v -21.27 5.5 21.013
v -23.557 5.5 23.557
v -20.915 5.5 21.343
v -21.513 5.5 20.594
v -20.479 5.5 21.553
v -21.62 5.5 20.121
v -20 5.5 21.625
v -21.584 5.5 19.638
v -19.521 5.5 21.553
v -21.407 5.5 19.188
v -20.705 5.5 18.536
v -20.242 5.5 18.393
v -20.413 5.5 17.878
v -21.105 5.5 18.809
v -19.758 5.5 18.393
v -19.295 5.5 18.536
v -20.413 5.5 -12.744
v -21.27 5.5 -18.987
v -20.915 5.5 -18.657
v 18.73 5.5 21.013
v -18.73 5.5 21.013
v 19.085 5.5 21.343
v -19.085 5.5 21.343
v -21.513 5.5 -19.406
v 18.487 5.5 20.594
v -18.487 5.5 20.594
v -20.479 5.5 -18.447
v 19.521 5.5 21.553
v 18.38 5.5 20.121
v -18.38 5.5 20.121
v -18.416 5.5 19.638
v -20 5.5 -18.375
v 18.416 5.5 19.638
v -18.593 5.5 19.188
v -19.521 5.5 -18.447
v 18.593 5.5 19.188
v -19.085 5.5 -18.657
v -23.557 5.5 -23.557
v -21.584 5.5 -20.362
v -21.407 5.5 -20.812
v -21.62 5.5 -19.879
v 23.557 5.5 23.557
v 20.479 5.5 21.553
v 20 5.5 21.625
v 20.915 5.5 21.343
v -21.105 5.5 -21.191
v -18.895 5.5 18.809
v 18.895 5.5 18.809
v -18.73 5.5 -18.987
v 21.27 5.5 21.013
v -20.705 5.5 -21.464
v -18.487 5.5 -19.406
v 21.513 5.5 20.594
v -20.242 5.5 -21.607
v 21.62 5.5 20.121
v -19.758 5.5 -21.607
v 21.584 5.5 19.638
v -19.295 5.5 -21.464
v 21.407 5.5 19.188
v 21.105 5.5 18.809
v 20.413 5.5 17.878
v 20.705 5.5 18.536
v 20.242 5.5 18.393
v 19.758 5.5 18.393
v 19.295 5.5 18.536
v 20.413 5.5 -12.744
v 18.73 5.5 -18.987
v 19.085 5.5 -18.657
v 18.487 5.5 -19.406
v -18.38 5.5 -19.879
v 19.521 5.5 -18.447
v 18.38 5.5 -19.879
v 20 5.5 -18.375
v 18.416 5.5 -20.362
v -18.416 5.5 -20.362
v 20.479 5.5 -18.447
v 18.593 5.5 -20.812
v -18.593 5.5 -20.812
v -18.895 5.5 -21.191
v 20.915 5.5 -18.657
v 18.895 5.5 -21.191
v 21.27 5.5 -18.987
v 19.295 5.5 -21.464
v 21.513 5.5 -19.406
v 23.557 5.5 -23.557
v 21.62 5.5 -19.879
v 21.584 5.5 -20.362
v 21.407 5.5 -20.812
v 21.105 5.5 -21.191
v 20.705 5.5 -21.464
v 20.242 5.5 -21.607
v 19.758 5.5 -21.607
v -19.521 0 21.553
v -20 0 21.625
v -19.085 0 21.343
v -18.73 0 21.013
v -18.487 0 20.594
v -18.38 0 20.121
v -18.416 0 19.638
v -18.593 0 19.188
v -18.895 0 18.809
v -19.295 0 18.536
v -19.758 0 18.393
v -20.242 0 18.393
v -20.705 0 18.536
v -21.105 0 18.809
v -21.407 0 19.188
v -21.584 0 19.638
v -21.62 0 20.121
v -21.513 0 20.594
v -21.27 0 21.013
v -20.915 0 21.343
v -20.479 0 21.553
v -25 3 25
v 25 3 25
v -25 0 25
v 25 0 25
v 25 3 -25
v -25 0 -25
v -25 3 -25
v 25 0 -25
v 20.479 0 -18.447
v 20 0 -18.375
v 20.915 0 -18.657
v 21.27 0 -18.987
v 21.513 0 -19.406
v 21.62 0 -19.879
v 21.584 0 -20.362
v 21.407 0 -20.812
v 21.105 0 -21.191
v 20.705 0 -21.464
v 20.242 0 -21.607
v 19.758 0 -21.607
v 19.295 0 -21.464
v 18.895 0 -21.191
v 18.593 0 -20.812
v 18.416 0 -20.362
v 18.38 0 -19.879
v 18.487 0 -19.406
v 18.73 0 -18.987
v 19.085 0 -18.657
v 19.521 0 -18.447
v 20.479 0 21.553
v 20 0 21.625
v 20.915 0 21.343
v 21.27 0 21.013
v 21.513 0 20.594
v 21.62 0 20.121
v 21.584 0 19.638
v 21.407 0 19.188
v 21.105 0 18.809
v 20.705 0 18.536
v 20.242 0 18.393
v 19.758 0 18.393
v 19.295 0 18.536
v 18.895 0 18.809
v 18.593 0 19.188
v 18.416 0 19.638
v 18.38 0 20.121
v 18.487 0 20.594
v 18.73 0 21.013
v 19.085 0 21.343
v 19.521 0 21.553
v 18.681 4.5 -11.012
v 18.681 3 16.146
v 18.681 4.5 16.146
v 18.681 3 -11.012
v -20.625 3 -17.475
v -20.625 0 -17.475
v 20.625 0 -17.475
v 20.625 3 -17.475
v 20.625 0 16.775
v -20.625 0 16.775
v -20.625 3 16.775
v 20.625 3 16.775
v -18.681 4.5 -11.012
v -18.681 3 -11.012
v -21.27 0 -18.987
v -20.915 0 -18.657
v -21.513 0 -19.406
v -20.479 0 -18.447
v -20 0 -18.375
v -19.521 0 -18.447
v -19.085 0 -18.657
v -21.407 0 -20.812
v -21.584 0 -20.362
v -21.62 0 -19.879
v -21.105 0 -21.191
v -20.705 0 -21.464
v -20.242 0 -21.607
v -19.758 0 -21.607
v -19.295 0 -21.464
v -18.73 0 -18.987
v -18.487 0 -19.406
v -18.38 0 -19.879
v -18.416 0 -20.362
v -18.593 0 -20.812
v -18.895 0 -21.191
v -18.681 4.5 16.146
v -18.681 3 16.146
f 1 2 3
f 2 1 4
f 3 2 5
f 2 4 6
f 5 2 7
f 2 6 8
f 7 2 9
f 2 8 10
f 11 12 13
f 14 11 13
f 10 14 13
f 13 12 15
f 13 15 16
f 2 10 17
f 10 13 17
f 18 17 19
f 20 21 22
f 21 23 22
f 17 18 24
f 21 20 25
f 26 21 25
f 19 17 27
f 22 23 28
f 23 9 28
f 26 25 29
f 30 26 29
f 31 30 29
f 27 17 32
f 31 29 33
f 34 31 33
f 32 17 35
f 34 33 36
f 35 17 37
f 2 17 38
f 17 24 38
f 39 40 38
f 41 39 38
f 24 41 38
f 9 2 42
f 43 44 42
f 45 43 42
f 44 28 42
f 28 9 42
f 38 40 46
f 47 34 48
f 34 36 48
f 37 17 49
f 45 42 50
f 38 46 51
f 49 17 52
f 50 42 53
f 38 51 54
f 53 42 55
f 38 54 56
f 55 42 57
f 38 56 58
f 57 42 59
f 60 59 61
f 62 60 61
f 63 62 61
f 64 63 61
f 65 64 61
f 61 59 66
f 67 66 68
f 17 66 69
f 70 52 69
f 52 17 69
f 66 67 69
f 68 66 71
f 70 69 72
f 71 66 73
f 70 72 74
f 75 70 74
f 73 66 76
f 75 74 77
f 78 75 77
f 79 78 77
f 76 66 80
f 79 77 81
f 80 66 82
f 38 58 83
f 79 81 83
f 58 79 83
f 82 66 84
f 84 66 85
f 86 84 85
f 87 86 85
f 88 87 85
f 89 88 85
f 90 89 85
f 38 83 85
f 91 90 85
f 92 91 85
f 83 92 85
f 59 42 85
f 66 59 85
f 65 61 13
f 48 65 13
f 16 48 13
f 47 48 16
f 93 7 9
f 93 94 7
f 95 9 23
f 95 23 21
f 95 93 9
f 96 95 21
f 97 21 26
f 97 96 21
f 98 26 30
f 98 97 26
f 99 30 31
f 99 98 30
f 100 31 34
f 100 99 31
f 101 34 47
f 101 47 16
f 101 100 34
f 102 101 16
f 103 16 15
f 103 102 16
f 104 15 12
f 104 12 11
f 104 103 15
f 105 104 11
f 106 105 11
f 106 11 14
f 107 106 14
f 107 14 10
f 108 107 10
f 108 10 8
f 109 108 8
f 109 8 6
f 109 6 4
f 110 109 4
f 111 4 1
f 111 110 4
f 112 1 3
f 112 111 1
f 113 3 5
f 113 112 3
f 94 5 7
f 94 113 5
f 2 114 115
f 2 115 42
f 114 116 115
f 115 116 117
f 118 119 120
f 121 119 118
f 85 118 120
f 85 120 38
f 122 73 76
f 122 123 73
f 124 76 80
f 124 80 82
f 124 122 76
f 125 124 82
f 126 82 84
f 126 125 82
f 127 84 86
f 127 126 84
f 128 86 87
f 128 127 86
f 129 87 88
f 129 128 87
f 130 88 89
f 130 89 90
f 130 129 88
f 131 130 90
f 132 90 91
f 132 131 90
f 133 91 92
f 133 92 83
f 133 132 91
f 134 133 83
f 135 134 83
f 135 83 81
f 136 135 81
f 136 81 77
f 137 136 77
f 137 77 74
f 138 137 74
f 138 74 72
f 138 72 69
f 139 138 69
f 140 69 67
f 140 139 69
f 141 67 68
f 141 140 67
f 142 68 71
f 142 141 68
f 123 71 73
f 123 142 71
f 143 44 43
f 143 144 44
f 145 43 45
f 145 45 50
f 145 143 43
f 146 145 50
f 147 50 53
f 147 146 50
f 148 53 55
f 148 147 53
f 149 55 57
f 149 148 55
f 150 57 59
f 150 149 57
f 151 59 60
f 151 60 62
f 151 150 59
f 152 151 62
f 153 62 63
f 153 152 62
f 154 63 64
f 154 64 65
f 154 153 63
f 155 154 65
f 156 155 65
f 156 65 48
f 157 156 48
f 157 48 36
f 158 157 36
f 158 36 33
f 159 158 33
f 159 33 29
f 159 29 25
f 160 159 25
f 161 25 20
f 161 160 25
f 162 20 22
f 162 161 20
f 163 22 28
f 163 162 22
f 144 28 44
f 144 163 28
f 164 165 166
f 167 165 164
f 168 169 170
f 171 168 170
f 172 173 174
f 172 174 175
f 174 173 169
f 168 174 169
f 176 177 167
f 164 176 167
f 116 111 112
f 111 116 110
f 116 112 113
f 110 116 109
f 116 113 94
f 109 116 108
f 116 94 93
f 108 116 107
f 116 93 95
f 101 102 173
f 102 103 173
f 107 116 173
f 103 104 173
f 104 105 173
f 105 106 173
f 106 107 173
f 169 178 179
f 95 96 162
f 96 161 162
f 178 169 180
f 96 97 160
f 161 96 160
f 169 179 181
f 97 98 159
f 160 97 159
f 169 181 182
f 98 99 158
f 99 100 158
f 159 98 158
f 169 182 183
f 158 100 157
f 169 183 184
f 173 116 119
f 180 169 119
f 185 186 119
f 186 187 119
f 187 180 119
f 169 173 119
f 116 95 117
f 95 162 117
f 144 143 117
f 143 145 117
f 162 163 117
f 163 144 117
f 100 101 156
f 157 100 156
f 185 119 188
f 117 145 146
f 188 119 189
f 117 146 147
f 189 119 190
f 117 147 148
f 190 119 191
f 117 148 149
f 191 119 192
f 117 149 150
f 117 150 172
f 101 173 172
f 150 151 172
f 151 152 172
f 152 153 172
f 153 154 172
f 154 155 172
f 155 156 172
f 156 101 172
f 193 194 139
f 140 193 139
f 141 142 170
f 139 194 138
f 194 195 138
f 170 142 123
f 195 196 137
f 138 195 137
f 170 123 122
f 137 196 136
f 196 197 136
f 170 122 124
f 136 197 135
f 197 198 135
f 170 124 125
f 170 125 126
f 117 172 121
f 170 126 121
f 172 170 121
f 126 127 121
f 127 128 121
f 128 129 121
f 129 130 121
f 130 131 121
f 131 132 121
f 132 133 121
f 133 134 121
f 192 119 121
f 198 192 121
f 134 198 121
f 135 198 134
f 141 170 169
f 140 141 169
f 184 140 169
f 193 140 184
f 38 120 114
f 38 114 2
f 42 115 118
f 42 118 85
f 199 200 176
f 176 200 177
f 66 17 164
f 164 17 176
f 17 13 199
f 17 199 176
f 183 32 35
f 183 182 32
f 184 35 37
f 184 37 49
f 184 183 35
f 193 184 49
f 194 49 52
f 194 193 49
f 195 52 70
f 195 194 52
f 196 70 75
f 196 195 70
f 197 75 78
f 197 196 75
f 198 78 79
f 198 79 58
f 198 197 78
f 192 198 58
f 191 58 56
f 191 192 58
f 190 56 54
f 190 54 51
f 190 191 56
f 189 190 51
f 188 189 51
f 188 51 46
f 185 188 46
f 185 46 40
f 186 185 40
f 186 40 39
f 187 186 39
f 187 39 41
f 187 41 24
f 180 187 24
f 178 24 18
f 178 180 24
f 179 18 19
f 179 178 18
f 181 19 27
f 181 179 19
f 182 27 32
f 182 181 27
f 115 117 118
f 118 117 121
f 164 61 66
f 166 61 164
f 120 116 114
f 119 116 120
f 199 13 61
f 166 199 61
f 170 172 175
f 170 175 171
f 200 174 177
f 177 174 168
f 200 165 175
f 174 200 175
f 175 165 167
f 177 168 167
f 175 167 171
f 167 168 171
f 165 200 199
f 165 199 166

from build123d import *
from OCP.BRepFilletAPI import BRepFilletAPI_MakeChamfer

# Parameters (mm, degrees)
SKETCH1_W           = 50
SKETCH1_H           = 50
SKETCH1_W_2         = 46
SKETCH1_H_2         = 46
SKETCH1_R           = 1.625
SKETCH1_W_3         = 41.25
SKETCH1_H_3         = 34.25
BOSS_EXTRUDE1_DEPTH = 3
BOSS_EXTRUDE2_START = 3
SKETCH1_3_W         = 46
SKETCH1_3_H         = 46
SKETCH1_3_R         = 1.625
SKETCH1_3_W_2       = 41.25
SKETCH1_3_H_2       = 34.25
SKETCH1_3_W_3       = 37.362596296
SKETCH1_3_H_3       = 27.15767644
BOSS_EXTRUDE2_DEPTH = 2.5
CHAMFER1_SIZE       = 2
CHAMFER1_SIZE_2     = 3.464101615
CHAMFER2_SIZE       = 1
CHAMFER2_SIZE2      = 1.732050808


with BuildPart() as part:
    # Sketch1 → Boss-Extrude1 (new body)
    # profile 1 of 2: a face of its own
    with BuildSketch(Plane(origin=(0, 0, 0), x_dir=(1, 0, 0), z_dir=(0, 1, 0))):
        Rectangle(SKETCH1_W, SKETCH1_H)
        Rectangle(SKETCH1_W_2, SKETCH1_H_2, mode=Mode.SUBTRACT)
    # profile 2 of 2: a face of its own
    with BuildSketch(Plane(origin=(0, 0, 0), x_dir=(1, 0, 0), z_dir=(0, 1, 0))):
        Rectangle(SKETCH1_W_2, SKETCH1_H_2)
        with Locations(Location((-20, -20, 0), (0, 0, 270))):
            Circle(SKETCH1_R, mode=Mode.SUBTRACT)
        with Locations(Location((20, -20, 0), (0, 0, 270))):
            Circle(SKETCH1_R, mode=Mode.SUBTRACT)
        with Locations(Location((20, 20, 0), (0, 0, 270))):
            Circle(SKETCH1_R, mode=Mode.SUBTRACT)
        with Locations(Location((-20, 20, 0), (0, 0, 270))):
            Circle(SKETCH1_R, mode=Mode.SUBTRACT)
        with Locations((0, 0.35)):
            Rectangle(SKETCH1_W_3, SKETCH1_H_3, mode=Mode.SUBTRACT)
    extrude(amount=BOSS_EXTRUDE1_DEPTH)

    # Sketch1<3> → Boss-Extrude2 (add)
    # profile 1 of 2: a face of its own
    with BuildSketch(Plane(origin=(0, 0, 0), x_dir=(1, 0, 0), z_dir=(0, 1, 0)).offset(BOSS_EXTRUDE2_START)):
        Rectangle(SKETCH1_3_W, SKETCH1_3_H)
        with Locations(Location((-20, -20, 0), (0, 0, 270))):
            Circle(SKETCH1_3_R, mode=Mode.SUBTRACT)
        with Locations(Location((20, -20, 0), (0, 0, 270))):
            Circle(SKETCH1_3_R, mode=Mode.SUBTRACT)
        with Locations(Location((20, 20, 0), (0, 0, 270))):
            Circle(SKETCH1_3_R, mode=Mode.SUBTRACT)
        with Locations(Location((-20, 20, 0), (0, 0, 270))):
            Circle(SKETCH1_3_R, mode=Mode.SUBTRACT)
        with Locations((0, 0.35)):
            Rectangle(SKETCH1_3_W_2, SKETCH1_3_H_2, mode=Mode.SUBTRACT)
    # profile 2 of 2: a face of its own
    with BuildSketch(Plane(origin=(0, 0, 0), x_dir=(1, 0, 0), z_dir=(0, 1, 0)).offset(BOSS_EXTRUDE2_START)):
        with Locations((0, 0.35)):
            Rectangle(SKETCH1_3_W_2, SKETCH1_3_H_2)
        with Locations((0, -2.566787067)):
            Rectangle(SKETCH1_3_W_3, SKETCH1_3_H_3, mode=Mode.SUBTRACT)
    extrude(amount=BOSS_EXTRUDE2_DEPTH)

    # Chamfer1
    # the kernel refuses this chamfer: 3.464101615, 2 mm, written as the material it adds along each edge
    with BuildSketch(Plane(origin=(-23, 3, -23), x_dir=(0, -0.05789386240267147, -0.9983227437537926), z_dir=(1, 0, 0))) as chamfer1_piece_1_section:
        Polygon((CHAMFER1_SIZE * 0.998322743754, CHAMFER1_SIZE * 0.0578938624027), (-CHAMFER1_SIZE_2 * 0.057893862405, CHAMFER1_SIZE_2 * 0.998322743793), (0, 0), align=None)
    chamfer1_piece_1 = extrude(amount=46, mode=Mode.PRIVATE)
    chamfer1_piece_1 = split(chamfer1_piece_1, bisect_by=Plane(origin=(0, 3.976343679, -25), z_dir=(0, 0, 1)), keep=Keep.TOP, mode=Mode.PRIVATE)
    chamfer1_piece_1 = split(chamfer1_piece_1, bisect_by=Plane(origin=(0, 5.5, -23.695570033), z_dir=(0, -1, 0)), keep=Keep.TOP, mode=Mode.PRIVATE)
    add(chamfer1_piece_1)
    with BuildSketch(Plane(origin=(-23, 3, 23), x_dir=(-0.9983227437537926, -0.05789386240267147, 0), z_dir=(0, 0, -1))) as chamfer1_piece_2_section:
        Polygon((CHAMFER1_SIZE * 0.998322743754, CHAMFER1_SIZE * 0.0578938624027), (-CHAMFER1_SIZE_2 * 0.057893862405, CHAMFER1_SIZE_2 * 0.998322743793), (0, 0), align=None)
    chamfer1_piece_2 = extrude(amount=46, mode=Mode.PRIVATE)
    chamfer1_piece_2 = split(chamfer1_piece_2, bisect_by=Plane(origin=(-25, 3.976343679, 0), z_dir=(1, 0, 0)), keep=Keep.TOP, mode=Mode.PRIVATE)
    chamfer1_piece_2 = split(chamfer1_piece_2, bisect_by=Plane(origin=(-23.695570033, 5.5, 0), z_dir=(0, -1, 0)), keep=Keep.TOP, mode=Mode.PRIVATE)
    add(chamfer1_piece_2)
    with BuildSketch(Plane(origin=(23, 3, 23), x_dir=(0, -0.05789386240267147, 0.9983227437537926), z_dir=(-1, 0, 0))) as chamfer1_piece_3_section:
        Polygon((CHAMFER1_SIZE * 0.998322743754, CHAMFER1_SIZE * 0.0578938624027), (-CHAMFER1_SIZE_2 * 0.057893862405, CHAMFER1_SIZE_2 * 0.998322743793), (0, 0), align=None)
    chamfer1_piece_3 = extrude(amount=46, mode=Mode.PRIVATE)
    chamfer1_piece_3 = split(chamfer1_piece_3, bisect_by=Plane(origin=(0, 3.976343679, 25), z_dir=(0, 0, -1)), keep=Keep.TOP, mode=Mode.PRIVATE)
    chamfer1_piece_3 = split(chamfer1_piece_3, bisect_by=Plane(origin=(0, 5.5, 23.695570033), z_dir=(0, -1, 0)), keep=Keep.TOP, mode=Mode.PRIVATE)
    add(chamfer1_piece_3)
    with BuildSketch(Plane(origin=(23, 3, -23), x_dir=(0.9983227437537926, -0.05789386240267147, 0), z_dir=(0, 0, 1))) as chamfer1_piece_4_section:
        Polygon((CHAMFER1_SIZE * 0.998322743754, CHAMFER1_SIZE * 0.0578938624027), (-CHAMFER1_SIZE_2 * 0.057893862405, CHAMFER1_SIZE_2 * 0.998322743793), (0, 0), align=None)
    chamfer1_piece_4 = extrude(amount=46, mode=Mode.PRIVATE)
    chamfer1_piece_4 = split(chamfer1_piece_4, bisect_by=Plane(origin=(25, 3.976343679, 0), z_dir=(-1, 0, 0)), keep=Keep.TOP, mode=Mode.PRIVATE)
    chamfer1_piece_4 = split(chamfer1_piece_4, bisect_by=Plane(origin=(23.695570033, 5.5, 0), z_dir=(0, -1, 0)), keep=Keep.TOP, mode=Mode.PRIVATE)
    add(chamfer1_piece_4)
    with BuildSketch(Plane(origin=(-23, 3, 23), x_dir=(-0.9983227437537926, -0.05789386240267147, 0), z_dir=(0, 0, -1))) as chamfer1_piece_5a_section:
        Polygon((CHAMFER1_SIZE * 0.998322743754, CHAMFER1_SIZE * 0.0578938624027), (-CHAMFER1_SIZE_2 * 0.057893862405, CHAMFER1_SIZE_2 * 0.998322743793), (0, 0), align=None)
    chamfer1_piece_5a = extrude(amount=54.961927941, mode=Mode.PRIVATE)
    chamfer1_piece_5a = split(chamfer1_piece_5a, bisect_by=Plane(origin=(-23.695570033, 3.976343679, -25), z_dir=(0, 0, 1)), keep=Keep.TOP, mode=Mode.PRIVATE)
    chamfer1_piece_5a = split(chamfer1_piece_5a, bisect_by=Plane(origin=(-25, 3.976343679, -24), z_dir=(1, 0, 0)), keep=Keep.TOP, mode=Mode.PRIVATE)
    chamfer1_piece_5a = split(chamfer1_piece_5a, bisect_by=Plane(origin=(-23.695570033, 3.976343679, -23), z_dir=(0, 0, -1)), keep=Keep.TOP, mode=Mode.PRIVATE)
    chamfer1_piece_5a = split(chamfer1_piece_5a, bisect_by=Plane(origin=(-23.695570033, 5.5, -24), z_dir=(0, -1, 0)), keep=Keep.TOP, mode=Mode.PRIVATE)
    with BuildSketch(Plane(origin=(-31.961927941, 3, -23), x_dir=(0, -0.05789386240267147, -0.9983227437537926), z_dir=(1, 0, 0))) as chamfer1_piece_5b_section:
        Polygon((CHAMFER1_SIZE * 0.998322743754, CHAMFER1_SIZE * 0.0578938624027), (-CHAMFER1_SIZE_2 * 0.057893862405, CHAMFER1_SIZE_2 * 0.998322743793), (0, 0), align=None)
    chamfer1_piece_5b = extrude(amount=54.961927941, mode=Mode.PRIVATE)
    chamfer1_piece_5b = split(chamfer1_piece_5b, bisect_by=Plane(origin=(-24, 3.976343679, -25), z_dir=(0, 0, 1)), keep=Keep.TOP, mode=Mode.PRIVATE)
    chamfer1_piece_5b = split(chamfer1_piece_5b, bisect_by=Plane(origin=(-25, 3.976343679, -23.695570033), z_dir=(1, 0, 0)), keep=Keep.TOP, mode=Mode.PRIVATE)
    chamfer1_piece_5b = split(chamfer1_piece_5b, bisect_by=Plane(origin=(-23, 3.976343679, -23.695570033), z_dir=(-1, 0, 0)), keep=Keep.TOP, mode=Mode.PRIVATE)
    chamfer1_piece_5b = split(chamfer1_piece_5b, bisect_by=Plane(origin=(-24, 5.5, -23.695570033), z_dir=(0, -1, 0)), keep=Keep.TOP, mode=Mode.PRIVATE)
    chamfer1_piece_5 = chamfer1_piece_5a & chamfer1_piece_5b
    add(chamfer1_piece_5)
    with BuildSketch(Plane(origin=(23, 3, -31.961927941), x_dir=(0.9983227437537926, -0.05789386240267147, 0), z_dir=(0, 0, 1))) as chamfer1_piece_6a_section:
        Polygon((CHAMFER1_SIZE * 0.998322743754, CHAMFER1_SIZE * 0.0578938624027), (-CHAMFER1_SIZE_2 * 0.057893862405, CHAMFER1_SIZE_2 * 0.998322743793), (0, 0), align=None)
    chamfer1_piece_6a = extrude(amount=54.961927941, mode=Mode.PRIVATE)
    chamfer1_piece_6a = split(chamfer1_piece_6a, bisect_by=Plane(origin=(25, 3.976343679, -24), z_dir=(-1, 0, 0)), keep=Keep.TOP, mode=Mode.PRIVATE)
    chamfer1_piece_6a = split(chamfer1_piece_6a, bisect_by=Plane(origin=(23.695570033, 3.976343679, -25), z_dir=(0, 0, 1)), keep=Keep.TOP, mode=Mode.PRIVATE)
    chamfer1_piece_6a = split(chamfer1_piece_6a, bisect_by=Plane(origin=(23.695570033, 3.976343679, -23), z_dir=(0, 0, -1)), keep=Keep.TOP, mode=Mode.PRIVATE)
    chamfer1_piece_6a = split(chamfer1_piece_6a, bisect_by=Plane(origin=(23.695570033, 5.5, -24), z_dir=(0, -1, 0)), keep=Keep.TOP, mode=Mode.PRIVATE)
    with BuildSketch(Plane(origin=(-23, 3, -23), x_dir=(0, -0.05789386240267147, -0.9983227437537926), z_dir=(1, 0, 0))) as chamfer1_piece_6b_section:
        Polygon((CHAMFER1_SIZE * 0.998322743754, CHAMFER1_SIZE * 0.0578938624027), (-CHAMFER1_SIZE_2 * 0.057893862405, CHAMFER1_SIZE_2 * 0.998322743793), (0, 0), align=None)
    chamfer1_piece_6b = extrude(amount=54.961927941, mode=Mode.PRIVATE)
    chamfer1_piece_6b = split(chamfer1_piece_6b, bisect_by=Plane(origin=(25, 3.976343679, -23.695570033), z_dir=(-1, 0, 0)), keep=Keep.TOP, mode=Mode.PRIVATE)
    chamfer1_piece_6b = split(chamfer1_piece_6b, bisect_by=Plane(origin=(24, 3.976343679, -25), z_dir=(0, 0, 1)), keep=Keep.TOP, mode=Mode.PRIVATE)
    chamfer1_piece_6b = split(chamfer1_piece_6b, bisect_by=Plane(origin=(23, 3.976343679, -23.695570033), z_dir=(1, 0, 0)), keep=Keep.TOP, mode=Mode.PRIVATE)
    chamfer1_piece_6b = split(chamfer1_piece_6b, bisect_by=Plane(origin=(24, 5.5, -23.695570033), z_dir=(0, -1, 0)), keep=Keep.TOP, mode=Mode.PRIVATE)
    chamfer1_piece_6 = chamfer1_piece_6a & chamfer1_piece_6b
    add(chamfer1_piece_6)
    with BuildSketch(Plane(origin=(23, 3, 23), x_dir=(0, -0.05789386240267147, 0.9983227437537926), z_dir=(-1, 0, 0))) as chamfer1_piece_7a_section:
        Polygon((CHAMFER1_SIZE * 0.998322743754, CHAMFER1_SIZE * 0.0578938624027), (-CHAMFER1_SIZE_2 * 0.057893862405, CHAMFER1_SIZE_2 * 0.998322743793), (0, 0), align=None)
    chamfer1_piece_7a = extrude(amount=54.961927941, mode=Mode.PRIVATE)
    chamfer1_piece_7a = split(chamfer1_piece_7a, bisect_by=Plane(origin=(-24, 3.976343679, 25), z_dir=(0, 0, -1)), keep=Keep.TOP, mode=Mode.PRIVATE)
    chamfer1_piece_7a = split(chamfer1_piece_7a, bisect_by=Plane(origin=(-25, 3.976343679, 23.695570033), z_dir=(1, 0, 0)), keep=Keep.TOP, mode=Mode.PRIVATE)
    chamfer1_piece_7a = split(chamfer1_piece_7a, bisect_by=Plane(origin=(-24, 5.5, 23.695570033), z_dir=(0, -1, 0)), keep=Keep.TOP, mode=Mode.PRIVATE)
    chamfer1_piece_7a = split(chamfer1_piece_7a, bisect_by=Plane(origin=(-23, 3.976343679, 23.695570033), z_dir=(-1, 0, 0)), keep=Keep.TOP, mode=Mode.PRIVATE)
    with BuildSketch(Plane(origin=(-23, 3, 31.961927941), x_dir=(-0.9983227437537926, -0.05789386240267147, 0), z_dir=(0, 0, -1))) as chamfer1_piece_7b_section:
        Polygon((CHAMFER1_SIZE * 0.998322743754, CHAMFER1_SIZE * 0.0578938624027), (-CHAMFER1_SIZE_2 * 0.057893862405, CHAMFER1_SIZE_2 * 0.998322743793), (0, 0), align=None)
    chamfer1_piece_7b = extrude(amount=54.961927941, mode=Mode.PRIVATE)
    chamfer1_piece_7b = split(chamfer1_piece_7b, bisect_by=Plane(origin=(-23.695570033, 3.976343679, 25), z_dir=(0, 0, -1)), keep=Keep.TOP, mode=Mode.PRIVATE)
    chamfer1_piece_7b = split(chamfer1_piece_7b, bisect_by=Plane(origin=(-25, 3.976343679, 24), z_dir=(1, 0, 0)), keep=Keep.TOP, mode=Mode.PRIVATE)
    chamfer1_piece_7b = split(chamfer1_piece_7b, bisect_by=Plane(origin=(-23.695570033, 5.5, 24), z_dir=(0, -1, 0)), keep=Keep.TOP, mode=Mode.PRIVATE)
    chamfer1_piece_7b = split(chamfer1_piece_7b, bisect_by=Plane(origin=(-23.695570033, 3.976343679, 23), z_dir=(0, 0, 1)), keep=Keep.TOP, mode=Mode.PRIVATE)
    chamfer1_piece_7 = chamfer1_piece_7a & chamfer1_piece_7b
    add(chamfer1_piece_7)
    with BuildSketch(Plane(origin=(23, 3, -23), x_dir=(0.9983227437537926, -0.05789386240267147, 0), z_dir=(0, 0, 1))) as chamfer1_piece_8a_section:
        Polygon((CHAMFER1_SIZE * 0.998322743754, CHAMFER1_SIZE * 0.0578938624027), (-CHAMFER1_SIZE_2 * 0.057893862405, CHAMFER1_SIZE_2 * 0.998322743793), (0, 0), align=None)
    chamfer1_piece_8a = extrude(amount=54.961927941, mode=Mode.PRIVATE)
    chamfer1_piece_8a = split(chamfer1_piece_8a, bisect_by=Plane(origin=(25, 3.976343679, 24), z_dir=(-1, 0, 0)), keep=Keep.TOP, mode=Mode.PRIVATE)
    chamfer1_piece_8a = split(chamfer1_piece_8a, bisect_by=Plane(origin=(23.695570033, 3.976343679, 25), z_dir=(0, 0, -1)), keep=Keep.TOP, mode=Mode.PRIVATE)
    chamfer1_piece_8a = split(chamfer1_piece_8a, bisect_by=Plane(origin=(23.695570033, 5.5, 24), z_dir=(0, -1, 0)), keep=Keep.TOP, mode=Mode.PRIVATE)
    chamfer1_piece_8a = split(chamfer1_piece_8a, bisect_by=Plane(origin=(23.695570033, 3.976343679, 23), z_dir=(0, 0, 1)), keep=Keep.TOP, mode=Mode.PRIVATE)
    with BuildSketch(Plane(origin=(31.961927941, 3, 23), x_dir=(0, -0.05789386240267147, 0.9983227437537926), z_dir=(-1, 0, 0))) as chamfer1_piece_8b_section:
        Polygon((CHAMFER1_SIZE * 0.998322743754, CHAMFER1_SIZE * 0.0578938624027), (-CHAMFER1_SIZE_2 * 0.057893862405, CHAMFER1_SIZE_2 * 0.998322743793), (0, 0), align=None)
    chamfer1_piece_8b = extrude(amount=54.961927941, mode=Mode.PRIVATE)
    chamfer1_piece_8b = split(chamfer1_piece_8b, bisect_by=Plane(origin=(25, 3.976343679, 23.695570033), z_dir=(-1, 0, 0)), keep=Keep.TOP, mode=Mode.PRIVATE)
    chamfer1_piece_8b = split(chamfer1_piece_8b, bisect_by=Plane(origin=(24, 3.976343679, 25), z_dir=(0, 0, -1)), keep=Keep.TOP, mode=Mode.PRIVATE)
    chamfer1_piece_8b = split(chamfer1_piece_8b, bisect_by=Plane(origin=(24, 5.5, 23.695570033), z_dir=(0, -1, 0)), keep=Keep.TOP, mode=Mode.PRIVATE)
    chamfer1_piece_8b = split(chamfer1_piece_8b, bisect_by=Plane(origin=(23, 3.976343679, 23.695570033), z_dir=(1, 0, 0)), keep=Keep.TOP, mode=Mode.PRIVATE)
    chamfer1_piece_8 = chamfer1_piece_8a & chamfer1_piece_8b
    add(chamfer1_piece_8)

    # Chamfer2: one chamfer whose edges measure the first distance from different faces: ONE call of the kernel's chamfer builder (chamfer() names one face for all edges)
    chamfer2_edges_1 = [part.edges().sort_by_distance(p)[0] for p in [
        (-18.681298148, 5.5, 2.566787067),
    ]]
    chamfer2_side_1 = [part.faces().sort_by_distance(p)[0] for p in [
        (-18.681298148, 4.25, 2.566787067),
    ]]
    chamfer2_edges_2 = [part.edges().sort_by_distance(p)[0] for p in [
        (0, 5.5, -11.012051153),
    ]]
    chamfer2_side_2 = [part.faces().sort_by_distance(p)[0] for p in [
        (0, 4.25, -11.012051153),
    ]]
    chamfer2_edges_3 = [part.edges().sort_by_distance(p)[0] for p in [
        (18.681298148, 5.5, 2.566787067),
    ]]
    chamfer2_side_3 = [part.faces().sort_by_distance(p)[0] for p in [
        (18.681298148, 4.25, 2.566787067),
    ]]
    chamfer2_edges_4 = [part.edges().sort_by_distance(p)[0] for p in [
        (0, 5.5, 16.145625287),
    ]]
    chamfer2_side_4 = [part.faces().sort_by_distance(p)[0] for p in [
        (0, 4.25, 16.145625287),
    ]]
    chamfer2 = BRepFilletAPI_MakeChamfer(part.part.solid().wrapped)
    for e in chamfer2_edges_1:
        chamfer2.Add(CHAMFER2_SIZE, CHAMFER2_SIZE2, e.wrapped, chamfer2_side_1[0].wrapped)  # the first distance lies on this face
    for e in chamfer2_edges_2:
        chamfer2.Add(CHAMFER2_SIZE, CHAMFER2_SIZE2, e.wrapped, chamfer2_side_2[0].wrapped)  # the first distance lies on this face
    for e in chamfer2_edges_3:
        chamfer2.Add(CHAMFER2_SIZE, CHAMFER2_SIZE2, e.wrapped, chamfer2_side_3[0].wrapped)  # the first distance lies on this face
    for e in chamfer2_edges_4:
        chamfer2.Add(CHAMFER2_SIZE, CHAMFER2_SIZE2, e.wrapped, chamfer2_side_4[0].wrapped)  # the first distance lies on this face
    add(Compound.cast(chamfer2.Shape()), mode=Mode.REPLACE)


solid = part.part
